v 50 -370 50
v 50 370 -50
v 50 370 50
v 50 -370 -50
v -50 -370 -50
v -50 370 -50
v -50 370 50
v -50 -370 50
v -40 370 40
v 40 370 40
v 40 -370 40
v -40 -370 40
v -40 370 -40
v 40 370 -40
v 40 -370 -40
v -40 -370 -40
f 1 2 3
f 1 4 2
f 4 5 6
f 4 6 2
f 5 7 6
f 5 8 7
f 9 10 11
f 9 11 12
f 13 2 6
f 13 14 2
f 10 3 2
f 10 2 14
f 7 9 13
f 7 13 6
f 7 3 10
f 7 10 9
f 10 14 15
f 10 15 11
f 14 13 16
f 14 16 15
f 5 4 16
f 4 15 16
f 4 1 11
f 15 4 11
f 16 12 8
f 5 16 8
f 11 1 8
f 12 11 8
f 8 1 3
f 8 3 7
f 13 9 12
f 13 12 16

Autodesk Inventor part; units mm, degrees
sketch "Esboço1" plane through (0, 0, 0) normal (0, 1, 0) x (-1, 0, 0)
  line L0 (-50, 50) -> (50, 50)
  line L1 (50, 50) -> (50, -50)
  line L2 (50, -50) -> (-50, -50)
  line L3 (-50, -50) -> (-50, 50)
  line L4 (-50, 50) -> (50, -50) construction
  line L5 (50, 50) -> (-50, -50) construction
  line L6 (-40, 40) -> (40, 40)
  line L7 (40, 40) -> (40, -40)
  line L8 (40, -40) -> (-40, -40)
  line L9 (-40, -40) -> (-40, 40)
  line L10 (-40, 40) -> (40, -40) construction
  line L11 (40, 40) -> (-40, -40) construction
  point P0 (0, 0)
  dimension "d0" = 100
  dimension "d1" = 10
extrude "Extrusão1" add sketch "Esboço1" along normal mid plane 740
equation "\"Raio_vergadura\" = Espessura"
equation "\"Largura_alívio_de_vergadura\" = Espessura"
equation "\"Profundidade_alívio_de_vergadura\" = 0.5 * Espessura"
equation "\"Tamanho_alívio_de_dobra\" = 4 * Espessura"
equation "\"Remanescente_mínimo\" = 2 * Espessura"
equation "\"Raiodetransição\" = Raio_vergadura"
equation "\"Tamanho_de_raio_de_Jacobi\" = Raio_vergadura"
equation "\"TamanhoFolga\" = Espessura"
equation "\"Espessura\" = 0.5"
properties part number "Perna para Exercício"
